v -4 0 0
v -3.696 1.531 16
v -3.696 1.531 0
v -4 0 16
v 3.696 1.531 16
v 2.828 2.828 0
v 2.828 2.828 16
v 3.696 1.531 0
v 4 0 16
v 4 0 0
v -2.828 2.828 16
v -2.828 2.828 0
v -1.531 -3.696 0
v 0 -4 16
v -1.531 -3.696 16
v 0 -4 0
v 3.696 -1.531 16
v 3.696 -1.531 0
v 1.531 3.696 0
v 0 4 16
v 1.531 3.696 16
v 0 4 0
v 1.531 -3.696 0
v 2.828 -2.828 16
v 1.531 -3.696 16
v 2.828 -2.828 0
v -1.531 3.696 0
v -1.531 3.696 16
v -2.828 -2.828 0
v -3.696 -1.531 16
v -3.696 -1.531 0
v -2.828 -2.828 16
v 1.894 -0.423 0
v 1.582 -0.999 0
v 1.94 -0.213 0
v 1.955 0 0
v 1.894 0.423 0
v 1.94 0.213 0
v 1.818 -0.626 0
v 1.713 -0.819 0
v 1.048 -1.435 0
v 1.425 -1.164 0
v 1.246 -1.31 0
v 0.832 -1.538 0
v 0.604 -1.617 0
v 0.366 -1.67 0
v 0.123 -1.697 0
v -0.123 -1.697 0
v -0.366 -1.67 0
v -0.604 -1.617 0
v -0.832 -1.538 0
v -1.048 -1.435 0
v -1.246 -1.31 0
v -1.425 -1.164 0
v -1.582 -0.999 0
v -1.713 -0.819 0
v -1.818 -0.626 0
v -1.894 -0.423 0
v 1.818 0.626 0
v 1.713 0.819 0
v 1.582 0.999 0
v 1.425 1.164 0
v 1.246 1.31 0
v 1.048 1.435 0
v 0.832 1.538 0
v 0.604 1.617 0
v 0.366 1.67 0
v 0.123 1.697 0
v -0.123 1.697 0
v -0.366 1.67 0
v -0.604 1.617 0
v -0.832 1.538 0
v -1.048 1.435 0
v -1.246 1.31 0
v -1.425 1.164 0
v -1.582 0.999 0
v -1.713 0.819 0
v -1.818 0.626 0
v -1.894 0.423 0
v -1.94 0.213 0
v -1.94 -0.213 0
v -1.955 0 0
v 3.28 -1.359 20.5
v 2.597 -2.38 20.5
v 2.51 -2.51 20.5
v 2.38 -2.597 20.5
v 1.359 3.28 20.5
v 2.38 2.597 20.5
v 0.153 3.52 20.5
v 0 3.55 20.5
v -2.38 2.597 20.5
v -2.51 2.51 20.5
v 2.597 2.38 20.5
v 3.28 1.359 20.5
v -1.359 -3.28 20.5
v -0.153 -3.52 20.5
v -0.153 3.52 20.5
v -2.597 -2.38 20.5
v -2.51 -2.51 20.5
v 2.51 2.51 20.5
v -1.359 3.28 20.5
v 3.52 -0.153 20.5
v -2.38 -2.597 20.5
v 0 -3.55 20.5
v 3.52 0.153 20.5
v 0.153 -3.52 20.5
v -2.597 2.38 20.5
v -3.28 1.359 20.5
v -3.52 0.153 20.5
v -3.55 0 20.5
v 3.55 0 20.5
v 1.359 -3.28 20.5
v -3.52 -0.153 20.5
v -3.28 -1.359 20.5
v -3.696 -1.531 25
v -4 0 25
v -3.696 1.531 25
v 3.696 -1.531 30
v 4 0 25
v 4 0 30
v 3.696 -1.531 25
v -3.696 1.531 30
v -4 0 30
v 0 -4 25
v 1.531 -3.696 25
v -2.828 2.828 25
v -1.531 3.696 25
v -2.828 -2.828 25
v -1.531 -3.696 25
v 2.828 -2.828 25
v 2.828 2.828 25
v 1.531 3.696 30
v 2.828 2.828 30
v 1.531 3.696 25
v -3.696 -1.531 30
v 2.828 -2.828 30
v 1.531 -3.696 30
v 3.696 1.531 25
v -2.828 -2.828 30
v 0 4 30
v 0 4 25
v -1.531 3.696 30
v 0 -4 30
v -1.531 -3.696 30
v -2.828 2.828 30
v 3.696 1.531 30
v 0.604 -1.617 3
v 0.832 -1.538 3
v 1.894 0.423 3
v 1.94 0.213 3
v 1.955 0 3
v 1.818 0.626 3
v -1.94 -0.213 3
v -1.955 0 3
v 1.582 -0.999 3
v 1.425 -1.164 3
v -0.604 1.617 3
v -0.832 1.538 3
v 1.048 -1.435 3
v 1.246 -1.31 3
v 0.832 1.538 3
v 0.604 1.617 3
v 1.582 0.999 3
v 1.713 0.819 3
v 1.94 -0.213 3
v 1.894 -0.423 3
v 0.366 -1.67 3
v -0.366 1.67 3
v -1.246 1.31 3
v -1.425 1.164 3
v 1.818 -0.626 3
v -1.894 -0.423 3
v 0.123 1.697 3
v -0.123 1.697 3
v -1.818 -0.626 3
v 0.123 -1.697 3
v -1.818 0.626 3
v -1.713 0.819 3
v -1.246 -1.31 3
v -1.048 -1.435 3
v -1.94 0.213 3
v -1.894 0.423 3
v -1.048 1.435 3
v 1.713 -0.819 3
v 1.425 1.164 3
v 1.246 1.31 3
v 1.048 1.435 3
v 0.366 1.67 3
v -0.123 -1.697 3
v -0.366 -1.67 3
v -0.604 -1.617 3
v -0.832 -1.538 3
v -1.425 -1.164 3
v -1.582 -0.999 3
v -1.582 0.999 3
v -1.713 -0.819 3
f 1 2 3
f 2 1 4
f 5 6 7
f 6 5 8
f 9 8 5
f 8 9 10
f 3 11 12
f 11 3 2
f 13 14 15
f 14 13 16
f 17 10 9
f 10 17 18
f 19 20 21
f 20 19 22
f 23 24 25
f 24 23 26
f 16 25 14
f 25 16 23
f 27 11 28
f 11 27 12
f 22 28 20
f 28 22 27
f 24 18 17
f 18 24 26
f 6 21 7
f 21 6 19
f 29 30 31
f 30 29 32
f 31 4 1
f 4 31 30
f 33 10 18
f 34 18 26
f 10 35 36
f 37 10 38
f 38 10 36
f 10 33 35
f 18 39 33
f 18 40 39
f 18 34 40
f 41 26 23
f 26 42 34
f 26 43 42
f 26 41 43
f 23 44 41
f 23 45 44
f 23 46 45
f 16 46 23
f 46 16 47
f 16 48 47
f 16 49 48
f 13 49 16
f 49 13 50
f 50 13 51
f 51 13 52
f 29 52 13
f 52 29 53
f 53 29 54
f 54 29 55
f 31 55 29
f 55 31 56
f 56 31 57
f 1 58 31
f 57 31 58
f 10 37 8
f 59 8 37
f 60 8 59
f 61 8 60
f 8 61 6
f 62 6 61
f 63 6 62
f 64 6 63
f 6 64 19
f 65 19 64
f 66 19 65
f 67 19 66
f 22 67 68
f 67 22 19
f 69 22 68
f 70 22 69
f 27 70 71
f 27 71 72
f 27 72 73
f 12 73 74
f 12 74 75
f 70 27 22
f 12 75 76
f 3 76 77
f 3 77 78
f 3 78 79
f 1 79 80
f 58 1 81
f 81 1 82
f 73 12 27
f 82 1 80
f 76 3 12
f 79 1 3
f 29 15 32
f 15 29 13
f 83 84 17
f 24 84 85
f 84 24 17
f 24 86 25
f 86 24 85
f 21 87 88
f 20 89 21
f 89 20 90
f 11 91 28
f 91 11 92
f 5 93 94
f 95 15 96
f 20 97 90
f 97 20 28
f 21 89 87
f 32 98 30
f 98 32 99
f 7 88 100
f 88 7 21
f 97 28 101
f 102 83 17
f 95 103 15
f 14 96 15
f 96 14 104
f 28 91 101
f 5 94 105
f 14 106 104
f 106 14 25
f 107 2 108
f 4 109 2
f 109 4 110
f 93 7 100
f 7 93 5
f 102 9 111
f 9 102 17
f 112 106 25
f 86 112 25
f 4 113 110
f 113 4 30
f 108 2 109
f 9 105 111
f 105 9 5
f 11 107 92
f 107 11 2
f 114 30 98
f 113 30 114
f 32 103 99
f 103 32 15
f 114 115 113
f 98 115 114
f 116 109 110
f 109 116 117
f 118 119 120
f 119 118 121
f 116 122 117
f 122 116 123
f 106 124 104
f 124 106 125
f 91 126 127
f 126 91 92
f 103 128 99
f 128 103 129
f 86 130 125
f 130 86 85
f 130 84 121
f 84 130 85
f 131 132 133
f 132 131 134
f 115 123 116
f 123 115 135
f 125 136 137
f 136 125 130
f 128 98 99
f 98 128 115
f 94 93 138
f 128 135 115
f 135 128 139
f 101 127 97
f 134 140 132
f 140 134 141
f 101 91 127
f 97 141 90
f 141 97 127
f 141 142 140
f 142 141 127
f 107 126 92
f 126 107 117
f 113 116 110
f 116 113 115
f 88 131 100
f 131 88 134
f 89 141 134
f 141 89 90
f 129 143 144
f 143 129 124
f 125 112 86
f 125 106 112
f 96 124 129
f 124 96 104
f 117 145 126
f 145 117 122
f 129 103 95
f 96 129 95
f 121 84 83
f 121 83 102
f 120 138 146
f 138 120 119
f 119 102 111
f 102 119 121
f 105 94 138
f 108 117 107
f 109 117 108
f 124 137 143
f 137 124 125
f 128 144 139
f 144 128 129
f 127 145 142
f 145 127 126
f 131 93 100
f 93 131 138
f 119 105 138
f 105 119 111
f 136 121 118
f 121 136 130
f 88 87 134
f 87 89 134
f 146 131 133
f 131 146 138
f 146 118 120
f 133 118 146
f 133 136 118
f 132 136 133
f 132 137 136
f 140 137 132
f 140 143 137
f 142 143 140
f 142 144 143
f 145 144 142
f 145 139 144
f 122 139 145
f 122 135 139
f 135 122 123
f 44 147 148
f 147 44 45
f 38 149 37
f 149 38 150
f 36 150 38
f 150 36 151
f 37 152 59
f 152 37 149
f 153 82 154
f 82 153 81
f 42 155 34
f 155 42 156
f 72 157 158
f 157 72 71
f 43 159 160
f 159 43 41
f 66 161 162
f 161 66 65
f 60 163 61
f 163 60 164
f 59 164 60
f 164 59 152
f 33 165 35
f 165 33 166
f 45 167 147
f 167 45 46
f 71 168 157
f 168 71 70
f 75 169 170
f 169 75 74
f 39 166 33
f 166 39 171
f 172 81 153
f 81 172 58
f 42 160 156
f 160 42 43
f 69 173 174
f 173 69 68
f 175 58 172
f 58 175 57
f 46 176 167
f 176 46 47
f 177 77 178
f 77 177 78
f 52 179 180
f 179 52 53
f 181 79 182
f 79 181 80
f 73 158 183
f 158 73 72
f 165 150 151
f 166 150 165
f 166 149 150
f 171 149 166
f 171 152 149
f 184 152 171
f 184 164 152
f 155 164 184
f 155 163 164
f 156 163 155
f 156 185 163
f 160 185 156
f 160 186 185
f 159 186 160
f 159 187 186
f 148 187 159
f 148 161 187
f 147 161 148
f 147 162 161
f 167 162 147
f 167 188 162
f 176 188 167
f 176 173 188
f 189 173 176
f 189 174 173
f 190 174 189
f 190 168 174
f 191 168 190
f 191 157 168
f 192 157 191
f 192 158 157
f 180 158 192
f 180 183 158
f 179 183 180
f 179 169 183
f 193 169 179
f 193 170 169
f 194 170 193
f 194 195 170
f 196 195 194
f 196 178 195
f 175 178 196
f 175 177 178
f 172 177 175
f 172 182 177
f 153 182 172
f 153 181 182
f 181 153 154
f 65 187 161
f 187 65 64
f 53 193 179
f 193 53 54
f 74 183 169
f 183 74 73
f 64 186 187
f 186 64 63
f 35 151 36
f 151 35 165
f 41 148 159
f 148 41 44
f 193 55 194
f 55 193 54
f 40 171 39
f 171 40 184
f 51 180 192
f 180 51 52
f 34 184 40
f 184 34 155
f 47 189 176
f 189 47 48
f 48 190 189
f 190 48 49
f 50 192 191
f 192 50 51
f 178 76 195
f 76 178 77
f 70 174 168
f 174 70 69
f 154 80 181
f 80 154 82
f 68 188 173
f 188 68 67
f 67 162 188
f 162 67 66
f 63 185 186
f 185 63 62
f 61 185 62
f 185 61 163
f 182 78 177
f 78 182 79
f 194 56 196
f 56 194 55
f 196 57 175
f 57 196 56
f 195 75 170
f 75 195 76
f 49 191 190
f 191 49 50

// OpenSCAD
// Millimeters to enlarge the screw's socket of, AKA "how accurate is your printer?"
margin=0.1; // [0.1, 0.2]
// Do you want a groove in the handle?
shapedHandle=1; // [1:Yes, 0:No]
// How many sides do you want the handle to have?
sides=16; // [3:1:100]

module screw_head() {
    scale([1.15, 1, 1]) cylinder(1, (3.3+margin)/2, (3.3+margin)/2, $fn=50);
}

difference() {
    if (shapedHandle) {
        union() {
            cylinder(15, 4, 4, $fn=sides);
            translate([0, 0, 15]) hull() {
                cylinder(1, 4, 4, $fn=sides);
                translate([0, 0, 5]) cylinder(1, 3.5, 3.5, $fn=sides);
            }
            hull() {
                translate([0, 0, 20]) cylinder(1, 3.5, 3.5, $fn=sides);
                translate([0, 0, 25]) cylinder(1, 4, 4, $fn=sides);
            }
            translate([0, 0, 25]) cylinder(5, 4, 4, $fn=sides);
        }
    } else {
        cylinder(30, 4, 4, $fn=sides);
    }
    translate([0, 0, -1]) scale([1, 1, 4]) screw_head();
}
